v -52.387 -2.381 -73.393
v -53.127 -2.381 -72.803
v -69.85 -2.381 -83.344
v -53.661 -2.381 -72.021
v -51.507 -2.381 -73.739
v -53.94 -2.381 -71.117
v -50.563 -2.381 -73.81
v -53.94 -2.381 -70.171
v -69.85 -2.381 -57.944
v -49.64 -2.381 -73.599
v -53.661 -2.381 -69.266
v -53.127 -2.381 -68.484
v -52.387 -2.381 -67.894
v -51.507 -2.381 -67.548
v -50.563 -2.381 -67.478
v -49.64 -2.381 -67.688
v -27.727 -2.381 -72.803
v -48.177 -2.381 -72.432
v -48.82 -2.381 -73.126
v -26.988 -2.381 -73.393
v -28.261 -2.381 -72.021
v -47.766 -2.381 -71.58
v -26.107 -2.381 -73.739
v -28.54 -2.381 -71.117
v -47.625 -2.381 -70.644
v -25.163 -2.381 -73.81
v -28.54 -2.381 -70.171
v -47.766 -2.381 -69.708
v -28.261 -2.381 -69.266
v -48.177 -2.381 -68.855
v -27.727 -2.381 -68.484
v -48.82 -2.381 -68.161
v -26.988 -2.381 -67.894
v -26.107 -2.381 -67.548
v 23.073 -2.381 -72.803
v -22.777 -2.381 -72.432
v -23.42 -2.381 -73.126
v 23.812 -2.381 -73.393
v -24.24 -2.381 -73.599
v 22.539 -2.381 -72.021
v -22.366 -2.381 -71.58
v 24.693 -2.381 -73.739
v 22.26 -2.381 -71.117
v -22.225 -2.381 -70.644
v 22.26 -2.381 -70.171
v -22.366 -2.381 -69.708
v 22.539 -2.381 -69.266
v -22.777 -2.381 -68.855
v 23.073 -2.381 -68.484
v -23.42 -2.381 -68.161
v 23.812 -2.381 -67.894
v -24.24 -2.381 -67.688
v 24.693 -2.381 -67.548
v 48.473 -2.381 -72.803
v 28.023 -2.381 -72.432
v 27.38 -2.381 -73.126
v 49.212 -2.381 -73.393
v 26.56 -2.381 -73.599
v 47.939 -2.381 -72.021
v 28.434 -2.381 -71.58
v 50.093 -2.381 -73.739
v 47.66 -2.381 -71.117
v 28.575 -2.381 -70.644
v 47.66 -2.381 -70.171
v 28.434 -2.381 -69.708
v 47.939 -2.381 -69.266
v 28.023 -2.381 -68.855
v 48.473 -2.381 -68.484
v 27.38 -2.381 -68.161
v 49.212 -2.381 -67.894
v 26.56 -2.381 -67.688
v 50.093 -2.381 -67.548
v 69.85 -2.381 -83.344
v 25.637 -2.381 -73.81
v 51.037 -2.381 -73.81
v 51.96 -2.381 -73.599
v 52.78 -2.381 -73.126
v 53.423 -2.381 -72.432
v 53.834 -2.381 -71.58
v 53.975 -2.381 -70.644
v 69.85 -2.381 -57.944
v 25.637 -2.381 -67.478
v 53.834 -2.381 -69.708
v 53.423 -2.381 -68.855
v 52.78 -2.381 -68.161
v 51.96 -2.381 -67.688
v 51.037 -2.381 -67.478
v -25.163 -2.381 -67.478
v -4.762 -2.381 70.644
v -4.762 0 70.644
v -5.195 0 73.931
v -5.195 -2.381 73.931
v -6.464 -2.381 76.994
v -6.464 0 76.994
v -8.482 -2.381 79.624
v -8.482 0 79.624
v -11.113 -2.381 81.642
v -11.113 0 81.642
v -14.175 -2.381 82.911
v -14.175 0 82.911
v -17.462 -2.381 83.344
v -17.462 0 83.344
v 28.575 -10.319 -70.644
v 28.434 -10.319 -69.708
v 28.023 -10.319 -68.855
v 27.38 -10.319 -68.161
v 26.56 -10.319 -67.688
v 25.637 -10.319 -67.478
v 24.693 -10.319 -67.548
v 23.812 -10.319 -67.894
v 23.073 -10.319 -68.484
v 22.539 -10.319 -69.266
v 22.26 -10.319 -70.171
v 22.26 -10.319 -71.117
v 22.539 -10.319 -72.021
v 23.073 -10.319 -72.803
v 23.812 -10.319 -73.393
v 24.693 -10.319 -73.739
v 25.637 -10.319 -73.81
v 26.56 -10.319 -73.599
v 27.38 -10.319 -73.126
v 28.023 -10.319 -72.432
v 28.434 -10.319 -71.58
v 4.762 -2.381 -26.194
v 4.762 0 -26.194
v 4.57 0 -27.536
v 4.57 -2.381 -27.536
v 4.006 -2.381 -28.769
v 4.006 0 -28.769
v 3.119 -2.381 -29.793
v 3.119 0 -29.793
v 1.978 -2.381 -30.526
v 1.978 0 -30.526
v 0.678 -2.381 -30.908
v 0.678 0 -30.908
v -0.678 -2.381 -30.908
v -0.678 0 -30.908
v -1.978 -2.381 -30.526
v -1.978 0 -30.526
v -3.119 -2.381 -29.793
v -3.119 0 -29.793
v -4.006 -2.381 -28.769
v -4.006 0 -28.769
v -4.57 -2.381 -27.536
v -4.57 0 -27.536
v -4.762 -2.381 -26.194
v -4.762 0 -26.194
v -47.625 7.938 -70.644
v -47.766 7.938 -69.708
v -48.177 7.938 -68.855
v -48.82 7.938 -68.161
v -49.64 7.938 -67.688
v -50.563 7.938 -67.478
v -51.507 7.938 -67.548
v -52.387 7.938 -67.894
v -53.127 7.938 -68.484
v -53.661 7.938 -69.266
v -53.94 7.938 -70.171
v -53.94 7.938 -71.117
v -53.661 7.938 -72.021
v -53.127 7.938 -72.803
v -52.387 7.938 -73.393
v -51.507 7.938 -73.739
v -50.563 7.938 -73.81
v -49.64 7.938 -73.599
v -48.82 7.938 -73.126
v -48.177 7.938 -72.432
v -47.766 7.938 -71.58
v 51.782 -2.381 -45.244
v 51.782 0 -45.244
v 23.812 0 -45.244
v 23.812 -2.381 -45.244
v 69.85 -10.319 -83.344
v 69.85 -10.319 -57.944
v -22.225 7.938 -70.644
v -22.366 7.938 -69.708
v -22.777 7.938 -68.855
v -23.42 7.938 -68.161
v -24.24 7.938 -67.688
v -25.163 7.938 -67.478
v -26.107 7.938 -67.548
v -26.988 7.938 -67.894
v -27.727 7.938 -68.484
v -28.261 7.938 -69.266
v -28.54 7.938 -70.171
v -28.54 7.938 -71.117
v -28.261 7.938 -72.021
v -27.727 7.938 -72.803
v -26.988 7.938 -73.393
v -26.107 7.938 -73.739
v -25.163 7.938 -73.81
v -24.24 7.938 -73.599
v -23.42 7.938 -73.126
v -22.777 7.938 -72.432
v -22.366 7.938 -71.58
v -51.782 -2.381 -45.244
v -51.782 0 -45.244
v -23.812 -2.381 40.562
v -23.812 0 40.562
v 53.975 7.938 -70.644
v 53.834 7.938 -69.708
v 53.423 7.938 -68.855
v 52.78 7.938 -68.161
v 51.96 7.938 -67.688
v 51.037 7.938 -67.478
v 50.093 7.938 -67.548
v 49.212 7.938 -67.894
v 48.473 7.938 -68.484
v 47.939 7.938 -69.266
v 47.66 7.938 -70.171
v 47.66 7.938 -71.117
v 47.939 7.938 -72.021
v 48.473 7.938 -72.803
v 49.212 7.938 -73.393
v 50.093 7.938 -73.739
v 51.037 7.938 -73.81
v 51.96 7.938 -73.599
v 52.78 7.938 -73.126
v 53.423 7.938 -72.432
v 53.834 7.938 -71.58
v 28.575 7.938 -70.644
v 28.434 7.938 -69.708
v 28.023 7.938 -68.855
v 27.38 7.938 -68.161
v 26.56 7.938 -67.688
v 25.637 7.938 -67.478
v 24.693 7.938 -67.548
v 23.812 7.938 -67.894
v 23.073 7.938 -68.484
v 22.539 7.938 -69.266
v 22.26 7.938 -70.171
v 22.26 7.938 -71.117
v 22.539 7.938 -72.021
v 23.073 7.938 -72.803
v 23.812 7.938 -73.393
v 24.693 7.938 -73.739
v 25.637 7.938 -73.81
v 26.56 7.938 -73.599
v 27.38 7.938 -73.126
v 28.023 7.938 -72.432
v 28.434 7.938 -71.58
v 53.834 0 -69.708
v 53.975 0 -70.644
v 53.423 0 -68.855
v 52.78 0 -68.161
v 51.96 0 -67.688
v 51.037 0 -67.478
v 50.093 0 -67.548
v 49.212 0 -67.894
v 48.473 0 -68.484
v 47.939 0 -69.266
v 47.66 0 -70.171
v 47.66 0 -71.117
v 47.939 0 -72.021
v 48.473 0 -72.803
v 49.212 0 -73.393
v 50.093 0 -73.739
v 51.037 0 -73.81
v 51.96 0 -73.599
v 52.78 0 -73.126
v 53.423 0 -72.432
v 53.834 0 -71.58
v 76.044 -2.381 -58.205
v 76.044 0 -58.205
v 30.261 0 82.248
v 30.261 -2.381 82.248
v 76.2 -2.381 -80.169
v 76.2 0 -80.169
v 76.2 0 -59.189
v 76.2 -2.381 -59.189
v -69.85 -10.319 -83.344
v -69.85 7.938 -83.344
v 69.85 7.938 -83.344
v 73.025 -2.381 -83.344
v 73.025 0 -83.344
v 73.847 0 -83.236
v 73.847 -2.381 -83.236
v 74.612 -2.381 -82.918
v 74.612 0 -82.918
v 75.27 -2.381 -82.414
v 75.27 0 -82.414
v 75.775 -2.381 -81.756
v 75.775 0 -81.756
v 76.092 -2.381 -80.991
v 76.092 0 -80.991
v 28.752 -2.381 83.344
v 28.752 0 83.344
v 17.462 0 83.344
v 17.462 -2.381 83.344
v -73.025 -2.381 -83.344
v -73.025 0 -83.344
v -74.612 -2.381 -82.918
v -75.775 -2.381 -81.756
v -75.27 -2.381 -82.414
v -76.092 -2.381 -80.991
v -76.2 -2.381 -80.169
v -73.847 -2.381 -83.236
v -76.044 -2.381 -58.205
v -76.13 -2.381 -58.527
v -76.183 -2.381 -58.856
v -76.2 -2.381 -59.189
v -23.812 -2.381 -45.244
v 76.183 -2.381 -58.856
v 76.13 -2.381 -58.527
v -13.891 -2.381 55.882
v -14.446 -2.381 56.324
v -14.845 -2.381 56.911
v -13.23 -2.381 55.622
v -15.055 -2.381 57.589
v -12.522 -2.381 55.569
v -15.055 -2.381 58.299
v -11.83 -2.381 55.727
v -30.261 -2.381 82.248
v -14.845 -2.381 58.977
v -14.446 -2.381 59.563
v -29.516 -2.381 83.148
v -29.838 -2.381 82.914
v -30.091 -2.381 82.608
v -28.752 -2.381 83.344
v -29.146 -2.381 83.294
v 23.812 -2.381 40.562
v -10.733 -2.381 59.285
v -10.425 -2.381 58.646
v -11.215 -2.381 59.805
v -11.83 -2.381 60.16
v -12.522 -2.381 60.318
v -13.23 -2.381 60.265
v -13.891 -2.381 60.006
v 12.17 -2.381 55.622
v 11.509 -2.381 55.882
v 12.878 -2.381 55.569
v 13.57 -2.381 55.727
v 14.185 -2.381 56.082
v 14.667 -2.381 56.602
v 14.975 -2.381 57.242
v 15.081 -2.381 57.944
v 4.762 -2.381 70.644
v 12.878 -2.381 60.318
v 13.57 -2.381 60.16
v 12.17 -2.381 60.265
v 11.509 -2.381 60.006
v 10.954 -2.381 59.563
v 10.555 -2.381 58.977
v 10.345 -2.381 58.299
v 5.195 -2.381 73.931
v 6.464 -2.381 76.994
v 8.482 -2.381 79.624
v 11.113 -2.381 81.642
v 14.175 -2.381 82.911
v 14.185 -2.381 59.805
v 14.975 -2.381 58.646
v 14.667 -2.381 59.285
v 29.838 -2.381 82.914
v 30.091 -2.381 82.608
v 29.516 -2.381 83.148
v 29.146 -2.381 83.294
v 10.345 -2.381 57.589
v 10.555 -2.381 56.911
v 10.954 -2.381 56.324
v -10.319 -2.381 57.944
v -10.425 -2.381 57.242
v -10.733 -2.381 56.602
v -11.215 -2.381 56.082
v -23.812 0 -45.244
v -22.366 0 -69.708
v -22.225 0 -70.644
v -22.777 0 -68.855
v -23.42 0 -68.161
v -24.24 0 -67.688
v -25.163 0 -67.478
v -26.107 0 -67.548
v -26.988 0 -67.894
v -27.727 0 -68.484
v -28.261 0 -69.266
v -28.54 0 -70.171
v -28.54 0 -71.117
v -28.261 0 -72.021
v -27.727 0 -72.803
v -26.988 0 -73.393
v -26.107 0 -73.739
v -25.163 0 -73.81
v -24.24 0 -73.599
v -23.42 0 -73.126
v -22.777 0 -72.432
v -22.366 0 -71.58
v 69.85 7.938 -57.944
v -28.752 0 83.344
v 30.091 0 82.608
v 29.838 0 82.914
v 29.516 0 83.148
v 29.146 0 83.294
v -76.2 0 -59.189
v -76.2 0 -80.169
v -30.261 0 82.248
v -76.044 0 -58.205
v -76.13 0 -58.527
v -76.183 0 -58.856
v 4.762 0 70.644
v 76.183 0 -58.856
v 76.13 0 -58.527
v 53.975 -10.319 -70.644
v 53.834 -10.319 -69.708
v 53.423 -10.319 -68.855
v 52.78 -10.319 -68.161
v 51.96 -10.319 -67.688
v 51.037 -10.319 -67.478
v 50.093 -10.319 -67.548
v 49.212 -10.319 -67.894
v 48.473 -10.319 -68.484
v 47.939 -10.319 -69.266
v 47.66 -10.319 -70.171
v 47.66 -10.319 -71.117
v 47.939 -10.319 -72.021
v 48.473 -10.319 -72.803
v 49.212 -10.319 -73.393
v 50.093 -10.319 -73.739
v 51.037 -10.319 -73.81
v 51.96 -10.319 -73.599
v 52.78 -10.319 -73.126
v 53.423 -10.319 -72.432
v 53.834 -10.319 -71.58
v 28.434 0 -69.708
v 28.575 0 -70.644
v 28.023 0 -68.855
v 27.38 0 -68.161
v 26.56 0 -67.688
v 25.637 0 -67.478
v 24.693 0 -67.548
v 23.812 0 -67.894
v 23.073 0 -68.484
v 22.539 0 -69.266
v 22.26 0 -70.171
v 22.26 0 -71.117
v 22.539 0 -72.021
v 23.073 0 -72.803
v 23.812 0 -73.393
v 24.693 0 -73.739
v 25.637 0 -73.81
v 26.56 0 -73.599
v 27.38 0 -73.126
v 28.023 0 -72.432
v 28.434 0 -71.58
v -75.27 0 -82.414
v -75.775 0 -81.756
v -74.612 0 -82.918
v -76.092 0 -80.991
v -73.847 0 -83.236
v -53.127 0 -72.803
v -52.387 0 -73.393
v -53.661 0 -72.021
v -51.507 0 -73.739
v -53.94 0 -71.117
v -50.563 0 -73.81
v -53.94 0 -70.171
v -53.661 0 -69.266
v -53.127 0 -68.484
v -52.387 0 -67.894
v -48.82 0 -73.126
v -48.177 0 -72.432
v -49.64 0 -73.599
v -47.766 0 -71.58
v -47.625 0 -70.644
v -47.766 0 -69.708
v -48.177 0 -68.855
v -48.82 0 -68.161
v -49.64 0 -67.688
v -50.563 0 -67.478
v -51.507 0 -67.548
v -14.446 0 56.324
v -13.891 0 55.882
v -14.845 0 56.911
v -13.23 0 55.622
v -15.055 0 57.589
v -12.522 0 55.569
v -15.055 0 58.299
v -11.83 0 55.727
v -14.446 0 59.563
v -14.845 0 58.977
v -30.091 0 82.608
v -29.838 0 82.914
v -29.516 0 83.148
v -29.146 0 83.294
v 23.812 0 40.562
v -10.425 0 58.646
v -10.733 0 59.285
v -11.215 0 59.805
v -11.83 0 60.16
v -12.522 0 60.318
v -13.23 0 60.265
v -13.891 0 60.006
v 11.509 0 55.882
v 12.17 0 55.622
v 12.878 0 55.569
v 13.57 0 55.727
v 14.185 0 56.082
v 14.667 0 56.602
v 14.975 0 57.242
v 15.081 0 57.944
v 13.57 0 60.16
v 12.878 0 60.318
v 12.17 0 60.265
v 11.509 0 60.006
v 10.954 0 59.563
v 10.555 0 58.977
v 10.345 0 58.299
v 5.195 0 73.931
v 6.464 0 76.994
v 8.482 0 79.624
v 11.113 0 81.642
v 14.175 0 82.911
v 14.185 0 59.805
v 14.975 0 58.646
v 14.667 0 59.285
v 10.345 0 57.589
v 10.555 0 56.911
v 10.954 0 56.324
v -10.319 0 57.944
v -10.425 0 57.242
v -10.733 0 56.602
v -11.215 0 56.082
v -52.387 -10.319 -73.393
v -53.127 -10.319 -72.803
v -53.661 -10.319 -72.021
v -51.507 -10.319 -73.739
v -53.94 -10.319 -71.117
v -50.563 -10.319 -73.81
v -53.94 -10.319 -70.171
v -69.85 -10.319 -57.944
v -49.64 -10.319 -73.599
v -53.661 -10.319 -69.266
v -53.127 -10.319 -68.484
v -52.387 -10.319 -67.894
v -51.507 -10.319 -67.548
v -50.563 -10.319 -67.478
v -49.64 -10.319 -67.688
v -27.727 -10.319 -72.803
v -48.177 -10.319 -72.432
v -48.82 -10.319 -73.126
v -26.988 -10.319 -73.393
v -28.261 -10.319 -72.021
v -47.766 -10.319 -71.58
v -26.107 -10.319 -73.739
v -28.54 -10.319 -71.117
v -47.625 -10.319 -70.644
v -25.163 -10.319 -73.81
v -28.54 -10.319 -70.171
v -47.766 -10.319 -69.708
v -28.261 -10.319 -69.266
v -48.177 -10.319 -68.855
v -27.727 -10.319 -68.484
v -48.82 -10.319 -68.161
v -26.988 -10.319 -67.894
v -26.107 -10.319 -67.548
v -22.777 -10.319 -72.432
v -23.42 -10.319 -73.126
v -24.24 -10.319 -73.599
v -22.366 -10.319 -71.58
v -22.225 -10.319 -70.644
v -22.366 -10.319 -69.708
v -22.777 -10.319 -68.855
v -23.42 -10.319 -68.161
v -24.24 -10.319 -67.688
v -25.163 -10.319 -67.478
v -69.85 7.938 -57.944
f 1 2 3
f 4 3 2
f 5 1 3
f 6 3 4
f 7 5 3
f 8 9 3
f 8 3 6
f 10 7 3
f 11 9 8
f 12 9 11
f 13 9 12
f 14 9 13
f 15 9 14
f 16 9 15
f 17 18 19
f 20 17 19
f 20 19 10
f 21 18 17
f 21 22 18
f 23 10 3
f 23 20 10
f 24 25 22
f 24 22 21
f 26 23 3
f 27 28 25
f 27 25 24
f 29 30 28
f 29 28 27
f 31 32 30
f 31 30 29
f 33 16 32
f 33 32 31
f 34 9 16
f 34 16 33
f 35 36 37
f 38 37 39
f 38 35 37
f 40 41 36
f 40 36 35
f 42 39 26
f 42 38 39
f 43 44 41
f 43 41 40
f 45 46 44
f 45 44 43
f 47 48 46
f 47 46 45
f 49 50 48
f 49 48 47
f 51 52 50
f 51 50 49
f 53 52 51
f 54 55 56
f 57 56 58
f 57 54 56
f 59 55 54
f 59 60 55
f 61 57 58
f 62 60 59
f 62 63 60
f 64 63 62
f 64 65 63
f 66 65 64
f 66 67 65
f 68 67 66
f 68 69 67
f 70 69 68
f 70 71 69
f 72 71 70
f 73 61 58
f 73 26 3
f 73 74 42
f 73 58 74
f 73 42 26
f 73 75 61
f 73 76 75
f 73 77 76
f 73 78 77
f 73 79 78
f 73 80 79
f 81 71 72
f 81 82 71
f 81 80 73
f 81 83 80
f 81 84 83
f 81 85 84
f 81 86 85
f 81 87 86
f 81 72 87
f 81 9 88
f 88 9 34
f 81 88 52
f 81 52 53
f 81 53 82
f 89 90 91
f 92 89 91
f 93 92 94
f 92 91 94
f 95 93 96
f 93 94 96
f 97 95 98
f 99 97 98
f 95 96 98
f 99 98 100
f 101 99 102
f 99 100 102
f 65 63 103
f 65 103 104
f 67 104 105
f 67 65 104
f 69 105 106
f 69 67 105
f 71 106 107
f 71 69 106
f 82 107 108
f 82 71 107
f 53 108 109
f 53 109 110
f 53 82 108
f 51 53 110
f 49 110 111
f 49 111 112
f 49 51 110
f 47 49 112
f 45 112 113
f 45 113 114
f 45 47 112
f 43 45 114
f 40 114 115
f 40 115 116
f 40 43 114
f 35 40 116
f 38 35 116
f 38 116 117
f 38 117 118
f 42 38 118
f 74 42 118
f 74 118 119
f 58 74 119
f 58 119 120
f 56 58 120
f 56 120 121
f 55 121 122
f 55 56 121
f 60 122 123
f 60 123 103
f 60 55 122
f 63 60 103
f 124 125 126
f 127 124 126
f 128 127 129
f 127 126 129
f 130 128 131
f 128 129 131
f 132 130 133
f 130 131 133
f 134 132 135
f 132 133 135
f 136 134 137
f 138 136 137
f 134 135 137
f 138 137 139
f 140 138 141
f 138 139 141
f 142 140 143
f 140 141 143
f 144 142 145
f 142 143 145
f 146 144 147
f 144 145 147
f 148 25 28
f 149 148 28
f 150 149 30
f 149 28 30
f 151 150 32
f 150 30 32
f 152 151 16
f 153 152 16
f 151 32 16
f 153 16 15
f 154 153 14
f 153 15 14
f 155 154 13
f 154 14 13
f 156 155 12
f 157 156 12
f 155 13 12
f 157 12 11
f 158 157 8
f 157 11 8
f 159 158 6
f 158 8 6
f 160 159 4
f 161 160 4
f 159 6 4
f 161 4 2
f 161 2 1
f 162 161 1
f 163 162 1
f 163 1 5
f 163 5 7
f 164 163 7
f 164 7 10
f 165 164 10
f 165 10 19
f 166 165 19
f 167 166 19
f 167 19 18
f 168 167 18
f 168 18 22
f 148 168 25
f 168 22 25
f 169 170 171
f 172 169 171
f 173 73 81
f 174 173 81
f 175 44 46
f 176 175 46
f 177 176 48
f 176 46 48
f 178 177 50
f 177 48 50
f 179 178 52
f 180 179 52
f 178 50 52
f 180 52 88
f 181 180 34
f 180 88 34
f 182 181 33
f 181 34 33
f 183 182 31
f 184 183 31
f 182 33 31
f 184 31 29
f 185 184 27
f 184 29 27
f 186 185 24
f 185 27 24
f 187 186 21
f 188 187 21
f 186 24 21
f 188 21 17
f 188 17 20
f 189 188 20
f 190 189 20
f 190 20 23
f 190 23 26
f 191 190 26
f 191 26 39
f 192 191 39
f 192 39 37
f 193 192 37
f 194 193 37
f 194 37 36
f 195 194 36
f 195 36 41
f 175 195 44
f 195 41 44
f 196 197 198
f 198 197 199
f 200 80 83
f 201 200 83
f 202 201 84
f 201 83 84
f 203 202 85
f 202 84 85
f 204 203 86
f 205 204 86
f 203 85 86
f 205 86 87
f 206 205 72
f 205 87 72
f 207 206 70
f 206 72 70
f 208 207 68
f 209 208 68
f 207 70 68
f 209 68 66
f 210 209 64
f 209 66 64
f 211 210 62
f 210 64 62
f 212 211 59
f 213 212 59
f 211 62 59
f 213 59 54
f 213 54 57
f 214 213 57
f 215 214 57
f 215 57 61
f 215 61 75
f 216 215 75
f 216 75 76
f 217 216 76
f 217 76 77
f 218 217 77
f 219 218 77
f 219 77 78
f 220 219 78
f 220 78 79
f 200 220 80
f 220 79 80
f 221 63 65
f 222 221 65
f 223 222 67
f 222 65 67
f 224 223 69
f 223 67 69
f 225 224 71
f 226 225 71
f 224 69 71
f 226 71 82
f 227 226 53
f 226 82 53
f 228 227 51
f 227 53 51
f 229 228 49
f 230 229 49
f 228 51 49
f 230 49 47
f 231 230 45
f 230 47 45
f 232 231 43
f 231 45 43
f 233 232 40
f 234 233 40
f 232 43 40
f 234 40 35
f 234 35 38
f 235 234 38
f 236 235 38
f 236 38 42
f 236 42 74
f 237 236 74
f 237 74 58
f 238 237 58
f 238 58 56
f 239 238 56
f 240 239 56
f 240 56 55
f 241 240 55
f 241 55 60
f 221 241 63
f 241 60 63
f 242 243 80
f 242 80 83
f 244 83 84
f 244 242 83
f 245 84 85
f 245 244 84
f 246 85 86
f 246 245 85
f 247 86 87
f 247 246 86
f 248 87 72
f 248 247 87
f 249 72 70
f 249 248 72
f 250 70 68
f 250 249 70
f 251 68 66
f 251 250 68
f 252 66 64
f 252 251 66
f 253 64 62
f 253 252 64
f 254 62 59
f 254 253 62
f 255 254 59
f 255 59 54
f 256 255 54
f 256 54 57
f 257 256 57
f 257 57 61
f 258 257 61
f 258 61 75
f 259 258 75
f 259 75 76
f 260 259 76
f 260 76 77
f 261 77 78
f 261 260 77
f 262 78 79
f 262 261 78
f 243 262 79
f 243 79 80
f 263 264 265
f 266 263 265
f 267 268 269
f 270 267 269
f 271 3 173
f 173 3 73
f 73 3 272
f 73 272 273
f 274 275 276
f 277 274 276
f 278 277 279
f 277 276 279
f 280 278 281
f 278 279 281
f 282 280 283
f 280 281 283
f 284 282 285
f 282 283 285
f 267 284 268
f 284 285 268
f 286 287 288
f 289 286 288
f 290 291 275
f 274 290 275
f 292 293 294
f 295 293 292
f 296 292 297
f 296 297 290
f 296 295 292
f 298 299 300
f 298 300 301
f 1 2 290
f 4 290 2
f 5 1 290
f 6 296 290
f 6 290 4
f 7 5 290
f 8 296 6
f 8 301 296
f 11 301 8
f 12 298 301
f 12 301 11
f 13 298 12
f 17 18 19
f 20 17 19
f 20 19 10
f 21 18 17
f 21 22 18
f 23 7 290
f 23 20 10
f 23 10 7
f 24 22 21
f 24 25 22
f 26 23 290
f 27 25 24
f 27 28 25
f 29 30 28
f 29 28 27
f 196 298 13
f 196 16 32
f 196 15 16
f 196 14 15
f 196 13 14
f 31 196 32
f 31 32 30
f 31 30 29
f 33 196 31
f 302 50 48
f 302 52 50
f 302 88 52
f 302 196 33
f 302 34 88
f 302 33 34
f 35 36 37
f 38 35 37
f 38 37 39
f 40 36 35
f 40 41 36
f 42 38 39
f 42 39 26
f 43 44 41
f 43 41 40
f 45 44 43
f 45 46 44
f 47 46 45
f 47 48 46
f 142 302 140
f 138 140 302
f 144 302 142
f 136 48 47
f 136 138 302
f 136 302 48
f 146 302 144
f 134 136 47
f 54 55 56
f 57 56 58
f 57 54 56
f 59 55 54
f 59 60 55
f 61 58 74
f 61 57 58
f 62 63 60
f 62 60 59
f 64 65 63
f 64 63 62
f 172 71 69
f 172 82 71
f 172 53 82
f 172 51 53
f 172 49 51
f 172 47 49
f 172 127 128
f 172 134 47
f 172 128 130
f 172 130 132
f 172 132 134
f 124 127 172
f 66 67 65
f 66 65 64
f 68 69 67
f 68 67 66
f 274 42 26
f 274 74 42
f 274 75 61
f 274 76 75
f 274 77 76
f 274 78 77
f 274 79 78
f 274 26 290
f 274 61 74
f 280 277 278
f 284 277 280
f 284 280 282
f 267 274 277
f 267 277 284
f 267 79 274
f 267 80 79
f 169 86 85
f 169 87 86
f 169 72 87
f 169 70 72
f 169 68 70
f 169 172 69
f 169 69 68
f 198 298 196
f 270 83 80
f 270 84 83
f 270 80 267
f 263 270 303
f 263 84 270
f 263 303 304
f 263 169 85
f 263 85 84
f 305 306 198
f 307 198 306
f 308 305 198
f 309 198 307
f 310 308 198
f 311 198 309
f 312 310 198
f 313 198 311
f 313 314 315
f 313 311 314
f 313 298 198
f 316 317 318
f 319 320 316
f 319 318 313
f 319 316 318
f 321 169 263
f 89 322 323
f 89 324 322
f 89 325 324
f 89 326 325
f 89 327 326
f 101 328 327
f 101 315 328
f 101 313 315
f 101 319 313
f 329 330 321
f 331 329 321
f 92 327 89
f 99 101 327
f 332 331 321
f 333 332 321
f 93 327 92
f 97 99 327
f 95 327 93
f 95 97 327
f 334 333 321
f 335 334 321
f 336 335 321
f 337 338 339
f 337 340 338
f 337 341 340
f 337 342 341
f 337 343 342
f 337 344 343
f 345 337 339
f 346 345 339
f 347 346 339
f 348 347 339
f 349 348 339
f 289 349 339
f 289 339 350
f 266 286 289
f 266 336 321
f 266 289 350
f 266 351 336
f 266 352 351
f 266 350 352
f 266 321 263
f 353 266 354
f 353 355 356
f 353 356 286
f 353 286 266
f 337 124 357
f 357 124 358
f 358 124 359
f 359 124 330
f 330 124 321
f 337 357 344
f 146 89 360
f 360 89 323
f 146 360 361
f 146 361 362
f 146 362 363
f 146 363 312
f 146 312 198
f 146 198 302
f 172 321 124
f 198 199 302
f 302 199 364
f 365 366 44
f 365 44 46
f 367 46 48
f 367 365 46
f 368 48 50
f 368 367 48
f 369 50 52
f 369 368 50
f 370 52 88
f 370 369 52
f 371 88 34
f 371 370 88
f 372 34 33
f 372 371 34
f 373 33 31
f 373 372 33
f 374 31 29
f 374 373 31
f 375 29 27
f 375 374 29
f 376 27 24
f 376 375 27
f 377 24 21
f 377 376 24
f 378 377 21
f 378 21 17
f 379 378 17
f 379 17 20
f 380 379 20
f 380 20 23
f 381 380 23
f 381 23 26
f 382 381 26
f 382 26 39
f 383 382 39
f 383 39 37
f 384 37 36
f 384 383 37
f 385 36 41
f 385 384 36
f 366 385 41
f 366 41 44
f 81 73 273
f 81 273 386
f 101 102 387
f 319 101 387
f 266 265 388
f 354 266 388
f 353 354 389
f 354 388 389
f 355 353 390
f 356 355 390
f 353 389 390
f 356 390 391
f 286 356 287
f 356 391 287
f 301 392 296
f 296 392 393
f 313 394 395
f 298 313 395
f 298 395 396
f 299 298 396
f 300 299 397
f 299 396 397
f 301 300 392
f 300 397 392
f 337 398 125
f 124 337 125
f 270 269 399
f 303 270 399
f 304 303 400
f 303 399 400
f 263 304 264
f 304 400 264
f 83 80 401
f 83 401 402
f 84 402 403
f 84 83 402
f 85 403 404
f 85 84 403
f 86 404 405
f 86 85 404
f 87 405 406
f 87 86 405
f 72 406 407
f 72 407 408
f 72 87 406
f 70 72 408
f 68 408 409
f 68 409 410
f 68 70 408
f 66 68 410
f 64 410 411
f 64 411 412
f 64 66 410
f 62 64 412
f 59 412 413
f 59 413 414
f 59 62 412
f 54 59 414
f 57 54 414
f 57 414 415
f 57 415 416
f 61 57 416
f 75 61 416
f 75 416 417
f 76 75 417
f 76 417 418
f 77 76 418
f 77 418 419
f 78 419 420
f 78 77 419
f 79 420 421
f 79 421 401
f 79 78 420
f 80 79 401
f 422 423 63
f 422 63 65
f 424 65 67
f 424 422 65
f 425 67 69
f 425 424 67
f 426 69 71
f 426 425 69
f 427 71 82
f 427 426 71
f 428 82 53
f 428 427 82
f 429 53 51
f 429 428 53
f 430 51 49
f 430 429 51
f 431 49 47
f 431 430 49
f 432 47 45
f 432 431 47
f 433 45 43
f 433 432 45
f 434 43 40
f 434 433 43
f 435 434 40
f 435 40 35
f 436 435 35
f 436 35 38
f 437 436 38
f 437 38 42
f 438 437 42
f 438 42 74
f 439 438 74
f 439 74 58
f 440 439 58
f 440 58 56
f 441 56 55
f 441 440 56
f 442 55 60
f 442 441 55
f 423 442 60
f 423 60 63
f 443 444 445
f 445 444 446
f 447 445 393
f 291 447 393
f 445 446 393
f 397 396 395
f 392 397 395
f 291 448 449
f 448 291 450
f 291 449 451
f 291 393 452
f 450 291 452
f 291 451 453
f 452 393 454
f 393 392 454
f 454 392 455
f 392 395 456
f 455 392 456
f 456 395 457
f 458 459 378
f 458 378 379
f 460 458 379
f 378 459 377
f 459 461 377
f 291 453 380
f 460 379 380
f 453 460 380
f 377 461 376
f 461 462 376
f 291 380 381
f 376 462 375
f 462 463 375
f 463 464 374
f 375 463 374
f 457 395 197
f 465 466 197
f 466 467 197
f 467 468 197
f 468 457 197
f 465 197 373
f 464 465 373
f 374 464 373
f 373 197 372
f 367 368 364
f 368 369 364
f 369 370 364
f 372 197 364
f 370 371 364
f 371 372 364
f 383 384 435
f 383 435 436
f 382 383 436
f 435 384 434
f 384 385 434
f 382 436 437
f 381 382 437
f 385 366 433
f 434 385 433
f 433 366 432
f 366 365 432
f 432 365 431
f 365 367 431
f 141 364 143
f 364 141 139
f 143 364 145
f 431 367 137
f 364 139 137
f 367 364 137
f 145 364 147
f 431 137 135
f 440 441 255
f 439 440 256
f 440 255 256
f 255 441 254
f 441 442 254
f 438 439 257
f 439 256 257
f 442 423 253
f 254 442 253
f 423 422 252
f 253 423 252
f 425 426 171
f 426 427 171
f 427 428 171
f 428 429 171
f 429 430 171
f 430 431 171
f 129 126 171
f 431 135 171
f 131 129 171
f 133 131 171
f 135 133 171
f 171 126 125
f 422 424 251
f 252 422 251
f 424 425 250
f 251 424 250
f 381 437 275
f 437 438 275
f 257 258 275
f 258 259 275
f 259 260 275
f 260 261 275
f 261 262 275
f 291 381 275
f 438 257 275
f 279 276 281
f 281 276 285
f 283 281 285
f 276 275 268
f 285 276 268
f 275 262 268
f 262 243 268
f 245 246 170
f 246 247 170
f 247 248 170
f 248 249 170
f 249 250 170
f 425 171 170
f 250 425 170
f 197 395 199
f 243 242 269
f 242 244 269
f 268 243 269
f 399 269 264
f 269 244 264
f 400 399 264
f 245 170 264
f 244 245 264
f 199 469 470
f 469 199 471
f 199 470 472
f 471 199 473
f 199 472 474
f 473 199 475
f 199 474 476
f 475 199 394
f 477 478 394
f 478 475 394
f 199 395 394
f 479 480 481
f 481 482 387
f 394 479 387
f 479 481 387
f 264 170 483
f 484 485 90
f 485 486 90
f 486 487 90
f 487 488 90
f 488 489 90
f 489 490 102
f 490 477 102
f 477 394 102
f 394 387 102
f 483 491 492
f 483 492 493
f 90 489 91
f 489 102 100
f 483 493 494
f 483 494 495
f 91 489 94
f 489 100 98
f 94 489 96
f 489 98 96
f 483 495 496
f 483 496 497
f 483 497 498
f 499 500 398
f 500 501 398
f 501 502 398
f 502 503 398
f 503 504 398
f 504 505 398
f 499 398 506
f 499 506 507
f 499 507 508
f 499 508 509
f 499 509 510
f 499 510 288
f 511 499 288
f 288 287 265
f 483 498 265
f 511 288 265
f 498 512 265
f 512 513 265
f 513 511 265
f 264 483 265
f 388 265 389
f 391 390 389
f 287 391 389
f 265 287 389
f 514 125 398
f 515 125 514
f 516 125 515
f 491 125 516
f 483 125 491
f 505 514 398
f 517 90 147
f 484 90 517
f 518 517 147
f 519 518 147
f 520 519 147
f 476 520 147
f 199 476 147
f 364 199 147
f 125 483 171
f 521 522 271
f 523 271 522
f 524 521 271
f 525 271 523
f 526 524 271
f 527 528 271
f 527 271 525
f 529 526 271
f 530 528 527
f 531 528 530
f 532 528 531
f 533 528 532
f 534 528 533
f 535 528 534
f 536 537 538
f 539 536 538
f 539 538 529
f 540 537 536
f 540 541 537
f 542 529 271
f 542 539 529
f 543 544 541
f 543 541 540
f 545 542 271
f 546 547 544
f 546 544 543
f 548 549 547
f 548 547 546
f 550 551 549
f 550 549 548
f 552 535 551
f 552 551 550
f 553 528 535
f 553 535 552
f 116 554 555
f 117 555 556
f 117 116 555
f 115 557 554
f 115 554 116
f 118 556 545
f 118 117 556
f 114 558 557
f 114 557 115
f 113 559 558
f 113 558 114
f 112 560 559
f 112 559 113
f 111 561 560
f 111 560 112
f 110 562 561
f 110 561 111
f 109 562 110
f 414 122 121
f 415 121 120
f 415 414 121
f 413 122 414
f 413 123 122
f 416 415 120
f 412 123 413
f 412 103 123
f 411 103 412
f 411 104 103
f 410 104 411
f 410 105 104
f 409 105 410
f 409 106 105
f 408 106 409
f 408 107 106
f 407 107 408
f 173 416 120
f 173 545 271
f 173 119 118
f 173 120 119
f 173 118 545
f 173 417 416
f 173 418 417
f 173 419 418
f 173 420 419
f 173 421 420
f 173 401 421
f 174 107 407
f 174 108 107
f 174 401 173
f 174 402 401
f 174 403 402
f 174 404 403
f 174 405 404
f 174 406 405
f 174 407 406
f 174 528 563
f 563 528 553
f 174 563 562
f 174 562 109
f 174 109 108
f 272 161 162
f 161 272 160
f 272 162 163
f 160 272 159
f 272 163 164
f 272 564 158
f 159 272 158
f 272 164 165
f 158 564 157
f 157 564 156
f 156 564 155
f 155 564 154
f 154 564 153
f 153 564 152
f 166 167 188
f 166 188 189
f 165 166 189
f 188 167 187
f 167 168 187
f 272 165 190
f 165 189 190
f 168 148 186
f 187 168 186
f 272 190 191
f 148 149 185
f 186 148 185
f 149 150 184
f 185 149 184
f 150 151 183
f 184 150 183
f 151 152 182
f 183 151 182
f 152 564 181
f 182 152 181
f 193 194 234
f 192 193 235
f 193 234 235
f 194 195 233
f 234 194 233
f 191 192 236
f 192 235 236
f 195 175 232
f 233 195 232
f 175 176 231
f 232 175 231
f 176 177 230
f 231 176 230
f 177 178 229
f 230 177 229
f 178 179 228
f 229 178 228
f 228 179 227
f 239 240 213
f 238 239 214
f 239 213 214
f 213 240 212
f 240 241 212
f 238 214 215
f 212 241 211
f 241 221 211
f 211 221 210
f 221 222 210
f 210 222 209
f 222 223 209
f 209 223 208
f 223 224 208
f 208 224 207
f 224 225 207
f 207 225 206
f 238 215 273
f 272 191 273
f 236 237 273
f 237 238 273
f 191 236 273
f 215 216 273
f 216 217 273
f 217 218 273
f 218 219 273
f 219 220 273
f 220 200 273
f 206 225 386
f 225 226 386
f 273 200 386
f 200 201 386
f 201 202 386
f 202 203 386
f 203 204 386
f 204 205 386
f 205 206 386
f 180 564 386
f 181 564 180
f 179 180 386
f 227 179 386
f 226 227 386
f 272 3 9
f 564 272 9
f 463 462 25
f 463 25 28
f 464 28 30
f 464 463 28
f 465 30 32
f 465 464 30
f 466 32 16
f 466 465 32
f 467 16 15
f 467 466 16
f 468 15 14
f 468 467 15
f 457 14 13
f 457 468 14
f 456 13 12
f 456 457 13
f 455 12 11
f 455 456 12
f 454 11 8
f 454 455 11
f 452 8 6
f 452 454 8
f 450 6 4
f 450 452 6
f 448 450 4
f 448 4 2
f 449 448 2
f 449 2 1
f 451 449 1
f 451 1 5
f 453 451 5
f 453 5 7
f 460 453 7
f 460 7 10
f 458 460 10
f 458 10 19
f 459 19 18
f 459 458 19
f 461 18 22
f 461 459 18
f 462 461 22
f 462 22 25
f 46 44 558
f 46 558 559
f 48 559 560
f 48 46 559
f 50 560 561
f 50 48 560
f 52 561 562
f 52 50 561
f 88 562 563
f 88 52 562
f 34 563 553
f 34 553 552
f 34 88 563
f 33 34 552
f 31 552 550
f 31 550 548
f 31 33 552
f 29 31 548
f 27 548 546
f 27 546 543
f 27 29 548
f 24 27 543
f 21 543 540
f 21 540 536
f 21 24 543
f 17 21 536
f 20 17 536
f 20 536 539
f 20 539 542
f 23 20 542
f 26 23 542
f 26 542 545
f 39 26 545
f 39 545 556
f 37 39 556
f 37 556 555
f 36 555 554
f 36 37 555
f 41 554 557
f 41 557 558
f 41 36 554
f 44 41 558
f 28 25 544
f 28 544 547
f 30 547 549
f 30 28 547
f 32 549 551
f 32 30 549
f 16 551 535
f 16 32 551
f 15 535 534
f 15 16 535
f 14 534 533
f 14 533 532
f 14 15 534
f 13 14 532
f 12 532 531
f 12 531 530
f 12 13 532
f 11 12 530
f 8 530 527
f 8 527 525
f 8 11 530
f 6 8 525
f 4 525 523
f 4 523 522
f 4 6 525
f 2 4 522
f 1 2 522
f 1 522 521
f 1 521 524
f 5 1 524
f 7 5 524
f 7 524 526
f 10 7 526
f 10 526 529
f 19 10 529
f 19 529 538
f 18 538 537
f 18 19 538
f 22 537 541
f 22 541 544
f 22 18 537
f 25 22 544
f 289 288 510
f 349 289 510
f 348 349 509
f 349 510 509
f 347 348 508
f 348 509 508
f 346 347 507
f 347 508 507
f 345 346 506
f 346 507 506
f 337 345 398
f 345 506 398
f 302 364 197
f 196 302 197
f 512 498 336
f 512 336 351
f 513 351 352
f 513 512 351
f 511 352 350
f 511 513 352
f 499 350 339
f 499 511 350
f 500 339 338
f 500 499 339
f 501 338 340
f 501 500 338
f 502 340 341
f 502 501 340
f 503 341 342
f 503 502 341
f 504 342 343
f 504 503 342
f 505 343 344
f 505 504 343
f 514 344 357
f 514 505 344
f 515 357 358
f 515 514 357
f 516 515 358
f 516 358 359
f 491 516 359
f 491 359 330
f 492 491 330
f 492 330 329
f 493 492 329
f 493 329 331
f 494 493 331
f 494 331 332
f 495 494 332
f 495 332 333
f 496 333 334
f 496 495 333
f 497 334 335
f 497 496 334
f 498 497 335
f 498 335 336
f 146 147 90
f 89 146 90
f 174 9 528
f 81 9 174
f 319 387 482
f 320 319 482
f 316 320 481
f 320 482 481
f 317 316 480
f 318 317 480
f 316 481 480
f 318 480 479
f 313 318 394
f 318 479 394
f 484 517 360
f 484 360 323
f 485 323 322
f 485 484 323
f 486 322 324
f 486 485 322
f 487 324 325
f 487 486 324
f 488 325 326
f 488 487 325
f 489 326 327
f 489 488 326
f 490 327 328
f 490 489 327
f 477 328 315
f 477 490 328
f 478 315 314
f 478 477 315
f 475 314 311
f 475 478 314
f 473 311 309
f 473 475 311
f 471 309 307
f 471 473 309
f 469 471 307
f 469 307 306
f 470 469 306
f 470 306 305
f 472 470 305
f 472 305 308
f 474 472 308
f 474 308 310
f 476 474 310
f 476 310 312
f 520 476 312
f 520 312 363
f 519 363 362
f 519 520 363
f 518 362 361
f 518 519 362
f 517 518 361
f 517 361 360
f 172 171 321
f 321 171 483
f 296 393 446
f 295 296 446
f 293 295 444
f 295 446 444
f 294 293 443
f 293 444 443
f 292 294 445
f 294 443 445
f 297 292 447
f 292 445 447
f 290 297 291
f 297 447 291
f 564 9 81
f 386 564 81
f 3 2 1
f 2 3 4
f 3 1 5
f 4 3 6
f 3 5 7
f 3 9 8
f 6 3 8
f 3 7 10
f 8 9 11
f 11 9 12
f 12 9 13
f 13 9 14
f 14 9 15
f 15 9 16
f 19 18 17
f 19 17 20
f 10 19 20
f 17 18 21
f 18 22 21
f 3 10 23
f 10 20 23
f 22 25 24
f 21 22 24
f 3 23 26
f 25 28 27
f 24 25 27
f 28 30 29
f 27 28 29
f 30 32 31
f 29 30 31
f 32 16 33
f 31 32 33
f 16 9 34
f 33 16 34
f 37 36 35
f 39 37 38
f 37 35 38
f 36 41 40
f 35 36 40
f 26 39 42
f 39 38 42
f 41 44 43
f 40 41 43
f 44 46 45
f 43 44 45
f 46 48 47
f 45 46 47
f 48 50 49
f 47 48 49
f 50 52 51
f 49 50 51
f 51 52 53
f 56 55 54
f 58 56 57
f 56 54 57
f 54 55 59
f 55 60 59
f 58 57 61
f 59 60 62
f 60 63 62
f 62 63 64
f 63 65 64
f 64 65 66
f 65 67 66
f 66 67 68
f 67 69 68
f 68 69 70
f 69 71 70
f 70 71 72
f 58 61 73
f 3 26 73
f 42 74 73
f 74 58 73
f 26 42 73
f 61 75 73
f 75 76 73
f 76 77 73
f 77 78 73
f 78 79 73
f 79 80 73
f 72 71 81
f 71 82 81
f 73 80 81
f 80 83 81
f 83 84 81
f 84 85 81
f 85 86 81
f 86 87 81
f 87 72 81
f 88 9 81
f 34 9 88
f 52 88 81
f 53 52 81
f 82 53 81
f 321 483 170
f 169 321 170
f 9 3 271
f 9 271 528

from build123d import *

# Parameters (mm, degrees)
F0_R     = 3.175
F0_R_2   = 2.38125
F1_DEPTH = 2.38125
F2_W     = 139.7
F2_H     = 25.4
F2_R     = 3.175
F3_DEPTH = 7.9375
F4_DEPTH = 10.31875


with BuildPart() as f1:
    # F0 (on Front) → F1 (new body)
    with BuildSketch(Plane.XZ):
        with BuildLine():
            ThreePointArc((-76.2, -80.16875), (-75.270064, -82.413814), (-73.025, -83.34375))
            Line((-73.025, -83.34375), (73.025, -83.34375))
            ThreePointArc((73.025, -83.34375), (75.270064, -82.413814), (76.2, -80.16875))
            Line((76.2, -80.16875), (76.2, -59.188689))
            ThreePointArc((76.2, -59.188689), (76.160675, -58.690527), (76.043675, -58.204705))
            Line((76.043675, -58.204705), (30.260863, 82.248242))
            ThreePointArc((30.260863, 82.248242), (29.684027, 83.041006), (28.751525, 83.34375))
            Line((28.751525, 83.34375), (17.4625, 83.34375))
            ThreePointArc((17.4625, 83.34375), (8.482244, 79.624006), (4.7625, 70.64375))
            Line((4.7625, 70.64375), (4.7625, -26.19375))
            ThreePointArc((4.7625, -26.19375), (0, -30.95625), (-4.7625, -26.19375))
            Line((-4.7625, -26.19375), (-4.7625, 70.64375))
            ThreePointArc((-4.7625, 70.64375), (-8.482244, 79.624006), (-17.4625, 83.34375))
            Line((-17.4625, 83.34375), (-28.751525, 83.34375))
            ThreePointArc((-28.751525, 83.34375), (-29.684027, 83.041006), (-30.260863, 82.248242))
            Line((-30.260863, 82.248242), (-76.043675, -58.204705))
            ThreePointArc((-76.043675, -58.204705), (-76.160675, -58.690527), (-76.2, -59.188689))
            Line((-76.2, -59.188689), (-76.2, -80.16875))
        make_face()
        with Locations((-50.8, -70.64375)):
            Circle(F0_R, mode=Mode.SUBTRACT)
        with Locations((-25.4, -70.64375)):
            Circle(F0_R, mode=Mode.SUBTRACT)
        Polygon((-51.782331, -45.24375), (-23.8125, 40.562362), (-23.8125, -45.24375), align=None, mode=Mode.SUBTRACT)
        with Locations((25.4, -70.64375)):
            Circle(F0_R, mode=Mode.SUBTRACT)
        with Locations((50.8, -70.64375)):
            Circle(F0_R, mode=Mode.SUBTRACT)
        Polygon((51.782331, -45.24375), (23.8125, -45.24375), (23.8125, 40.562362), align=None, mode=Mode.SUBTRACT)
        with Locations((-12.7, 57.94375)):
            Circle(F0_R_2, mode=Mode.SUBTRACT)
        with Locations((12.7, 57.94375)):
            Circle(F0_R_2, mode=Mode.SUBTRACT)
    extrude(amount=F1_DEPTH)


with BuildPart() as f3:
    # F2 (on face) → F3 (new body)
    with BuildSketch(Plane.XZ.offset(2.38125)):
        with Locations((0, -70.64375)):
            Rectangle(F2_W, F2_H)
        with Locations((-50.8, -70.64375)):
            Circle(F2_R, mode=Mode.SUBTRACT)
        with Locations((-25.4, -70.64375)):
            Circle(F2_R, mode=Mode.SUBTRACT)
        with Locations((25.4, -70.64375)):
            Circle(F2_R, mode=Mode.SUBTRACT)
        with Locations((50.8, -70.64375)):
            Circle(F2_R, mode=Mode.SUBTRACT)
    extrude(amount=F3_DEPTH)


with BuildPart() as f4:
    # F2 (on face) → F4 (new body)
    with BuildSketch(Plane.XZ.offset(2.38125)):
        with Locations((0, -70.64375)):
            Rectangle(F2_W, F2_H)
        with Locations((-50.8, -70.64375)):
            Circle(F2_R, mode=Mode.SUBTRACT)
        with Locations((-25.4, -70.64375)):
            Circle(F2_R, mode=Mode.SUBTRACT)
        with Locations((25.4, -70.64375)):
            Circle(F2_R, mode=Mode.SUBTRACT)
        with Locations((50.8, -70.64375)):
            Circle(F2_R, mode=Mode.SUBTRACT)
    extrude(amount=-F4_DEPTH)


solid = Compound([f1.part, f3.part, f4.part])
